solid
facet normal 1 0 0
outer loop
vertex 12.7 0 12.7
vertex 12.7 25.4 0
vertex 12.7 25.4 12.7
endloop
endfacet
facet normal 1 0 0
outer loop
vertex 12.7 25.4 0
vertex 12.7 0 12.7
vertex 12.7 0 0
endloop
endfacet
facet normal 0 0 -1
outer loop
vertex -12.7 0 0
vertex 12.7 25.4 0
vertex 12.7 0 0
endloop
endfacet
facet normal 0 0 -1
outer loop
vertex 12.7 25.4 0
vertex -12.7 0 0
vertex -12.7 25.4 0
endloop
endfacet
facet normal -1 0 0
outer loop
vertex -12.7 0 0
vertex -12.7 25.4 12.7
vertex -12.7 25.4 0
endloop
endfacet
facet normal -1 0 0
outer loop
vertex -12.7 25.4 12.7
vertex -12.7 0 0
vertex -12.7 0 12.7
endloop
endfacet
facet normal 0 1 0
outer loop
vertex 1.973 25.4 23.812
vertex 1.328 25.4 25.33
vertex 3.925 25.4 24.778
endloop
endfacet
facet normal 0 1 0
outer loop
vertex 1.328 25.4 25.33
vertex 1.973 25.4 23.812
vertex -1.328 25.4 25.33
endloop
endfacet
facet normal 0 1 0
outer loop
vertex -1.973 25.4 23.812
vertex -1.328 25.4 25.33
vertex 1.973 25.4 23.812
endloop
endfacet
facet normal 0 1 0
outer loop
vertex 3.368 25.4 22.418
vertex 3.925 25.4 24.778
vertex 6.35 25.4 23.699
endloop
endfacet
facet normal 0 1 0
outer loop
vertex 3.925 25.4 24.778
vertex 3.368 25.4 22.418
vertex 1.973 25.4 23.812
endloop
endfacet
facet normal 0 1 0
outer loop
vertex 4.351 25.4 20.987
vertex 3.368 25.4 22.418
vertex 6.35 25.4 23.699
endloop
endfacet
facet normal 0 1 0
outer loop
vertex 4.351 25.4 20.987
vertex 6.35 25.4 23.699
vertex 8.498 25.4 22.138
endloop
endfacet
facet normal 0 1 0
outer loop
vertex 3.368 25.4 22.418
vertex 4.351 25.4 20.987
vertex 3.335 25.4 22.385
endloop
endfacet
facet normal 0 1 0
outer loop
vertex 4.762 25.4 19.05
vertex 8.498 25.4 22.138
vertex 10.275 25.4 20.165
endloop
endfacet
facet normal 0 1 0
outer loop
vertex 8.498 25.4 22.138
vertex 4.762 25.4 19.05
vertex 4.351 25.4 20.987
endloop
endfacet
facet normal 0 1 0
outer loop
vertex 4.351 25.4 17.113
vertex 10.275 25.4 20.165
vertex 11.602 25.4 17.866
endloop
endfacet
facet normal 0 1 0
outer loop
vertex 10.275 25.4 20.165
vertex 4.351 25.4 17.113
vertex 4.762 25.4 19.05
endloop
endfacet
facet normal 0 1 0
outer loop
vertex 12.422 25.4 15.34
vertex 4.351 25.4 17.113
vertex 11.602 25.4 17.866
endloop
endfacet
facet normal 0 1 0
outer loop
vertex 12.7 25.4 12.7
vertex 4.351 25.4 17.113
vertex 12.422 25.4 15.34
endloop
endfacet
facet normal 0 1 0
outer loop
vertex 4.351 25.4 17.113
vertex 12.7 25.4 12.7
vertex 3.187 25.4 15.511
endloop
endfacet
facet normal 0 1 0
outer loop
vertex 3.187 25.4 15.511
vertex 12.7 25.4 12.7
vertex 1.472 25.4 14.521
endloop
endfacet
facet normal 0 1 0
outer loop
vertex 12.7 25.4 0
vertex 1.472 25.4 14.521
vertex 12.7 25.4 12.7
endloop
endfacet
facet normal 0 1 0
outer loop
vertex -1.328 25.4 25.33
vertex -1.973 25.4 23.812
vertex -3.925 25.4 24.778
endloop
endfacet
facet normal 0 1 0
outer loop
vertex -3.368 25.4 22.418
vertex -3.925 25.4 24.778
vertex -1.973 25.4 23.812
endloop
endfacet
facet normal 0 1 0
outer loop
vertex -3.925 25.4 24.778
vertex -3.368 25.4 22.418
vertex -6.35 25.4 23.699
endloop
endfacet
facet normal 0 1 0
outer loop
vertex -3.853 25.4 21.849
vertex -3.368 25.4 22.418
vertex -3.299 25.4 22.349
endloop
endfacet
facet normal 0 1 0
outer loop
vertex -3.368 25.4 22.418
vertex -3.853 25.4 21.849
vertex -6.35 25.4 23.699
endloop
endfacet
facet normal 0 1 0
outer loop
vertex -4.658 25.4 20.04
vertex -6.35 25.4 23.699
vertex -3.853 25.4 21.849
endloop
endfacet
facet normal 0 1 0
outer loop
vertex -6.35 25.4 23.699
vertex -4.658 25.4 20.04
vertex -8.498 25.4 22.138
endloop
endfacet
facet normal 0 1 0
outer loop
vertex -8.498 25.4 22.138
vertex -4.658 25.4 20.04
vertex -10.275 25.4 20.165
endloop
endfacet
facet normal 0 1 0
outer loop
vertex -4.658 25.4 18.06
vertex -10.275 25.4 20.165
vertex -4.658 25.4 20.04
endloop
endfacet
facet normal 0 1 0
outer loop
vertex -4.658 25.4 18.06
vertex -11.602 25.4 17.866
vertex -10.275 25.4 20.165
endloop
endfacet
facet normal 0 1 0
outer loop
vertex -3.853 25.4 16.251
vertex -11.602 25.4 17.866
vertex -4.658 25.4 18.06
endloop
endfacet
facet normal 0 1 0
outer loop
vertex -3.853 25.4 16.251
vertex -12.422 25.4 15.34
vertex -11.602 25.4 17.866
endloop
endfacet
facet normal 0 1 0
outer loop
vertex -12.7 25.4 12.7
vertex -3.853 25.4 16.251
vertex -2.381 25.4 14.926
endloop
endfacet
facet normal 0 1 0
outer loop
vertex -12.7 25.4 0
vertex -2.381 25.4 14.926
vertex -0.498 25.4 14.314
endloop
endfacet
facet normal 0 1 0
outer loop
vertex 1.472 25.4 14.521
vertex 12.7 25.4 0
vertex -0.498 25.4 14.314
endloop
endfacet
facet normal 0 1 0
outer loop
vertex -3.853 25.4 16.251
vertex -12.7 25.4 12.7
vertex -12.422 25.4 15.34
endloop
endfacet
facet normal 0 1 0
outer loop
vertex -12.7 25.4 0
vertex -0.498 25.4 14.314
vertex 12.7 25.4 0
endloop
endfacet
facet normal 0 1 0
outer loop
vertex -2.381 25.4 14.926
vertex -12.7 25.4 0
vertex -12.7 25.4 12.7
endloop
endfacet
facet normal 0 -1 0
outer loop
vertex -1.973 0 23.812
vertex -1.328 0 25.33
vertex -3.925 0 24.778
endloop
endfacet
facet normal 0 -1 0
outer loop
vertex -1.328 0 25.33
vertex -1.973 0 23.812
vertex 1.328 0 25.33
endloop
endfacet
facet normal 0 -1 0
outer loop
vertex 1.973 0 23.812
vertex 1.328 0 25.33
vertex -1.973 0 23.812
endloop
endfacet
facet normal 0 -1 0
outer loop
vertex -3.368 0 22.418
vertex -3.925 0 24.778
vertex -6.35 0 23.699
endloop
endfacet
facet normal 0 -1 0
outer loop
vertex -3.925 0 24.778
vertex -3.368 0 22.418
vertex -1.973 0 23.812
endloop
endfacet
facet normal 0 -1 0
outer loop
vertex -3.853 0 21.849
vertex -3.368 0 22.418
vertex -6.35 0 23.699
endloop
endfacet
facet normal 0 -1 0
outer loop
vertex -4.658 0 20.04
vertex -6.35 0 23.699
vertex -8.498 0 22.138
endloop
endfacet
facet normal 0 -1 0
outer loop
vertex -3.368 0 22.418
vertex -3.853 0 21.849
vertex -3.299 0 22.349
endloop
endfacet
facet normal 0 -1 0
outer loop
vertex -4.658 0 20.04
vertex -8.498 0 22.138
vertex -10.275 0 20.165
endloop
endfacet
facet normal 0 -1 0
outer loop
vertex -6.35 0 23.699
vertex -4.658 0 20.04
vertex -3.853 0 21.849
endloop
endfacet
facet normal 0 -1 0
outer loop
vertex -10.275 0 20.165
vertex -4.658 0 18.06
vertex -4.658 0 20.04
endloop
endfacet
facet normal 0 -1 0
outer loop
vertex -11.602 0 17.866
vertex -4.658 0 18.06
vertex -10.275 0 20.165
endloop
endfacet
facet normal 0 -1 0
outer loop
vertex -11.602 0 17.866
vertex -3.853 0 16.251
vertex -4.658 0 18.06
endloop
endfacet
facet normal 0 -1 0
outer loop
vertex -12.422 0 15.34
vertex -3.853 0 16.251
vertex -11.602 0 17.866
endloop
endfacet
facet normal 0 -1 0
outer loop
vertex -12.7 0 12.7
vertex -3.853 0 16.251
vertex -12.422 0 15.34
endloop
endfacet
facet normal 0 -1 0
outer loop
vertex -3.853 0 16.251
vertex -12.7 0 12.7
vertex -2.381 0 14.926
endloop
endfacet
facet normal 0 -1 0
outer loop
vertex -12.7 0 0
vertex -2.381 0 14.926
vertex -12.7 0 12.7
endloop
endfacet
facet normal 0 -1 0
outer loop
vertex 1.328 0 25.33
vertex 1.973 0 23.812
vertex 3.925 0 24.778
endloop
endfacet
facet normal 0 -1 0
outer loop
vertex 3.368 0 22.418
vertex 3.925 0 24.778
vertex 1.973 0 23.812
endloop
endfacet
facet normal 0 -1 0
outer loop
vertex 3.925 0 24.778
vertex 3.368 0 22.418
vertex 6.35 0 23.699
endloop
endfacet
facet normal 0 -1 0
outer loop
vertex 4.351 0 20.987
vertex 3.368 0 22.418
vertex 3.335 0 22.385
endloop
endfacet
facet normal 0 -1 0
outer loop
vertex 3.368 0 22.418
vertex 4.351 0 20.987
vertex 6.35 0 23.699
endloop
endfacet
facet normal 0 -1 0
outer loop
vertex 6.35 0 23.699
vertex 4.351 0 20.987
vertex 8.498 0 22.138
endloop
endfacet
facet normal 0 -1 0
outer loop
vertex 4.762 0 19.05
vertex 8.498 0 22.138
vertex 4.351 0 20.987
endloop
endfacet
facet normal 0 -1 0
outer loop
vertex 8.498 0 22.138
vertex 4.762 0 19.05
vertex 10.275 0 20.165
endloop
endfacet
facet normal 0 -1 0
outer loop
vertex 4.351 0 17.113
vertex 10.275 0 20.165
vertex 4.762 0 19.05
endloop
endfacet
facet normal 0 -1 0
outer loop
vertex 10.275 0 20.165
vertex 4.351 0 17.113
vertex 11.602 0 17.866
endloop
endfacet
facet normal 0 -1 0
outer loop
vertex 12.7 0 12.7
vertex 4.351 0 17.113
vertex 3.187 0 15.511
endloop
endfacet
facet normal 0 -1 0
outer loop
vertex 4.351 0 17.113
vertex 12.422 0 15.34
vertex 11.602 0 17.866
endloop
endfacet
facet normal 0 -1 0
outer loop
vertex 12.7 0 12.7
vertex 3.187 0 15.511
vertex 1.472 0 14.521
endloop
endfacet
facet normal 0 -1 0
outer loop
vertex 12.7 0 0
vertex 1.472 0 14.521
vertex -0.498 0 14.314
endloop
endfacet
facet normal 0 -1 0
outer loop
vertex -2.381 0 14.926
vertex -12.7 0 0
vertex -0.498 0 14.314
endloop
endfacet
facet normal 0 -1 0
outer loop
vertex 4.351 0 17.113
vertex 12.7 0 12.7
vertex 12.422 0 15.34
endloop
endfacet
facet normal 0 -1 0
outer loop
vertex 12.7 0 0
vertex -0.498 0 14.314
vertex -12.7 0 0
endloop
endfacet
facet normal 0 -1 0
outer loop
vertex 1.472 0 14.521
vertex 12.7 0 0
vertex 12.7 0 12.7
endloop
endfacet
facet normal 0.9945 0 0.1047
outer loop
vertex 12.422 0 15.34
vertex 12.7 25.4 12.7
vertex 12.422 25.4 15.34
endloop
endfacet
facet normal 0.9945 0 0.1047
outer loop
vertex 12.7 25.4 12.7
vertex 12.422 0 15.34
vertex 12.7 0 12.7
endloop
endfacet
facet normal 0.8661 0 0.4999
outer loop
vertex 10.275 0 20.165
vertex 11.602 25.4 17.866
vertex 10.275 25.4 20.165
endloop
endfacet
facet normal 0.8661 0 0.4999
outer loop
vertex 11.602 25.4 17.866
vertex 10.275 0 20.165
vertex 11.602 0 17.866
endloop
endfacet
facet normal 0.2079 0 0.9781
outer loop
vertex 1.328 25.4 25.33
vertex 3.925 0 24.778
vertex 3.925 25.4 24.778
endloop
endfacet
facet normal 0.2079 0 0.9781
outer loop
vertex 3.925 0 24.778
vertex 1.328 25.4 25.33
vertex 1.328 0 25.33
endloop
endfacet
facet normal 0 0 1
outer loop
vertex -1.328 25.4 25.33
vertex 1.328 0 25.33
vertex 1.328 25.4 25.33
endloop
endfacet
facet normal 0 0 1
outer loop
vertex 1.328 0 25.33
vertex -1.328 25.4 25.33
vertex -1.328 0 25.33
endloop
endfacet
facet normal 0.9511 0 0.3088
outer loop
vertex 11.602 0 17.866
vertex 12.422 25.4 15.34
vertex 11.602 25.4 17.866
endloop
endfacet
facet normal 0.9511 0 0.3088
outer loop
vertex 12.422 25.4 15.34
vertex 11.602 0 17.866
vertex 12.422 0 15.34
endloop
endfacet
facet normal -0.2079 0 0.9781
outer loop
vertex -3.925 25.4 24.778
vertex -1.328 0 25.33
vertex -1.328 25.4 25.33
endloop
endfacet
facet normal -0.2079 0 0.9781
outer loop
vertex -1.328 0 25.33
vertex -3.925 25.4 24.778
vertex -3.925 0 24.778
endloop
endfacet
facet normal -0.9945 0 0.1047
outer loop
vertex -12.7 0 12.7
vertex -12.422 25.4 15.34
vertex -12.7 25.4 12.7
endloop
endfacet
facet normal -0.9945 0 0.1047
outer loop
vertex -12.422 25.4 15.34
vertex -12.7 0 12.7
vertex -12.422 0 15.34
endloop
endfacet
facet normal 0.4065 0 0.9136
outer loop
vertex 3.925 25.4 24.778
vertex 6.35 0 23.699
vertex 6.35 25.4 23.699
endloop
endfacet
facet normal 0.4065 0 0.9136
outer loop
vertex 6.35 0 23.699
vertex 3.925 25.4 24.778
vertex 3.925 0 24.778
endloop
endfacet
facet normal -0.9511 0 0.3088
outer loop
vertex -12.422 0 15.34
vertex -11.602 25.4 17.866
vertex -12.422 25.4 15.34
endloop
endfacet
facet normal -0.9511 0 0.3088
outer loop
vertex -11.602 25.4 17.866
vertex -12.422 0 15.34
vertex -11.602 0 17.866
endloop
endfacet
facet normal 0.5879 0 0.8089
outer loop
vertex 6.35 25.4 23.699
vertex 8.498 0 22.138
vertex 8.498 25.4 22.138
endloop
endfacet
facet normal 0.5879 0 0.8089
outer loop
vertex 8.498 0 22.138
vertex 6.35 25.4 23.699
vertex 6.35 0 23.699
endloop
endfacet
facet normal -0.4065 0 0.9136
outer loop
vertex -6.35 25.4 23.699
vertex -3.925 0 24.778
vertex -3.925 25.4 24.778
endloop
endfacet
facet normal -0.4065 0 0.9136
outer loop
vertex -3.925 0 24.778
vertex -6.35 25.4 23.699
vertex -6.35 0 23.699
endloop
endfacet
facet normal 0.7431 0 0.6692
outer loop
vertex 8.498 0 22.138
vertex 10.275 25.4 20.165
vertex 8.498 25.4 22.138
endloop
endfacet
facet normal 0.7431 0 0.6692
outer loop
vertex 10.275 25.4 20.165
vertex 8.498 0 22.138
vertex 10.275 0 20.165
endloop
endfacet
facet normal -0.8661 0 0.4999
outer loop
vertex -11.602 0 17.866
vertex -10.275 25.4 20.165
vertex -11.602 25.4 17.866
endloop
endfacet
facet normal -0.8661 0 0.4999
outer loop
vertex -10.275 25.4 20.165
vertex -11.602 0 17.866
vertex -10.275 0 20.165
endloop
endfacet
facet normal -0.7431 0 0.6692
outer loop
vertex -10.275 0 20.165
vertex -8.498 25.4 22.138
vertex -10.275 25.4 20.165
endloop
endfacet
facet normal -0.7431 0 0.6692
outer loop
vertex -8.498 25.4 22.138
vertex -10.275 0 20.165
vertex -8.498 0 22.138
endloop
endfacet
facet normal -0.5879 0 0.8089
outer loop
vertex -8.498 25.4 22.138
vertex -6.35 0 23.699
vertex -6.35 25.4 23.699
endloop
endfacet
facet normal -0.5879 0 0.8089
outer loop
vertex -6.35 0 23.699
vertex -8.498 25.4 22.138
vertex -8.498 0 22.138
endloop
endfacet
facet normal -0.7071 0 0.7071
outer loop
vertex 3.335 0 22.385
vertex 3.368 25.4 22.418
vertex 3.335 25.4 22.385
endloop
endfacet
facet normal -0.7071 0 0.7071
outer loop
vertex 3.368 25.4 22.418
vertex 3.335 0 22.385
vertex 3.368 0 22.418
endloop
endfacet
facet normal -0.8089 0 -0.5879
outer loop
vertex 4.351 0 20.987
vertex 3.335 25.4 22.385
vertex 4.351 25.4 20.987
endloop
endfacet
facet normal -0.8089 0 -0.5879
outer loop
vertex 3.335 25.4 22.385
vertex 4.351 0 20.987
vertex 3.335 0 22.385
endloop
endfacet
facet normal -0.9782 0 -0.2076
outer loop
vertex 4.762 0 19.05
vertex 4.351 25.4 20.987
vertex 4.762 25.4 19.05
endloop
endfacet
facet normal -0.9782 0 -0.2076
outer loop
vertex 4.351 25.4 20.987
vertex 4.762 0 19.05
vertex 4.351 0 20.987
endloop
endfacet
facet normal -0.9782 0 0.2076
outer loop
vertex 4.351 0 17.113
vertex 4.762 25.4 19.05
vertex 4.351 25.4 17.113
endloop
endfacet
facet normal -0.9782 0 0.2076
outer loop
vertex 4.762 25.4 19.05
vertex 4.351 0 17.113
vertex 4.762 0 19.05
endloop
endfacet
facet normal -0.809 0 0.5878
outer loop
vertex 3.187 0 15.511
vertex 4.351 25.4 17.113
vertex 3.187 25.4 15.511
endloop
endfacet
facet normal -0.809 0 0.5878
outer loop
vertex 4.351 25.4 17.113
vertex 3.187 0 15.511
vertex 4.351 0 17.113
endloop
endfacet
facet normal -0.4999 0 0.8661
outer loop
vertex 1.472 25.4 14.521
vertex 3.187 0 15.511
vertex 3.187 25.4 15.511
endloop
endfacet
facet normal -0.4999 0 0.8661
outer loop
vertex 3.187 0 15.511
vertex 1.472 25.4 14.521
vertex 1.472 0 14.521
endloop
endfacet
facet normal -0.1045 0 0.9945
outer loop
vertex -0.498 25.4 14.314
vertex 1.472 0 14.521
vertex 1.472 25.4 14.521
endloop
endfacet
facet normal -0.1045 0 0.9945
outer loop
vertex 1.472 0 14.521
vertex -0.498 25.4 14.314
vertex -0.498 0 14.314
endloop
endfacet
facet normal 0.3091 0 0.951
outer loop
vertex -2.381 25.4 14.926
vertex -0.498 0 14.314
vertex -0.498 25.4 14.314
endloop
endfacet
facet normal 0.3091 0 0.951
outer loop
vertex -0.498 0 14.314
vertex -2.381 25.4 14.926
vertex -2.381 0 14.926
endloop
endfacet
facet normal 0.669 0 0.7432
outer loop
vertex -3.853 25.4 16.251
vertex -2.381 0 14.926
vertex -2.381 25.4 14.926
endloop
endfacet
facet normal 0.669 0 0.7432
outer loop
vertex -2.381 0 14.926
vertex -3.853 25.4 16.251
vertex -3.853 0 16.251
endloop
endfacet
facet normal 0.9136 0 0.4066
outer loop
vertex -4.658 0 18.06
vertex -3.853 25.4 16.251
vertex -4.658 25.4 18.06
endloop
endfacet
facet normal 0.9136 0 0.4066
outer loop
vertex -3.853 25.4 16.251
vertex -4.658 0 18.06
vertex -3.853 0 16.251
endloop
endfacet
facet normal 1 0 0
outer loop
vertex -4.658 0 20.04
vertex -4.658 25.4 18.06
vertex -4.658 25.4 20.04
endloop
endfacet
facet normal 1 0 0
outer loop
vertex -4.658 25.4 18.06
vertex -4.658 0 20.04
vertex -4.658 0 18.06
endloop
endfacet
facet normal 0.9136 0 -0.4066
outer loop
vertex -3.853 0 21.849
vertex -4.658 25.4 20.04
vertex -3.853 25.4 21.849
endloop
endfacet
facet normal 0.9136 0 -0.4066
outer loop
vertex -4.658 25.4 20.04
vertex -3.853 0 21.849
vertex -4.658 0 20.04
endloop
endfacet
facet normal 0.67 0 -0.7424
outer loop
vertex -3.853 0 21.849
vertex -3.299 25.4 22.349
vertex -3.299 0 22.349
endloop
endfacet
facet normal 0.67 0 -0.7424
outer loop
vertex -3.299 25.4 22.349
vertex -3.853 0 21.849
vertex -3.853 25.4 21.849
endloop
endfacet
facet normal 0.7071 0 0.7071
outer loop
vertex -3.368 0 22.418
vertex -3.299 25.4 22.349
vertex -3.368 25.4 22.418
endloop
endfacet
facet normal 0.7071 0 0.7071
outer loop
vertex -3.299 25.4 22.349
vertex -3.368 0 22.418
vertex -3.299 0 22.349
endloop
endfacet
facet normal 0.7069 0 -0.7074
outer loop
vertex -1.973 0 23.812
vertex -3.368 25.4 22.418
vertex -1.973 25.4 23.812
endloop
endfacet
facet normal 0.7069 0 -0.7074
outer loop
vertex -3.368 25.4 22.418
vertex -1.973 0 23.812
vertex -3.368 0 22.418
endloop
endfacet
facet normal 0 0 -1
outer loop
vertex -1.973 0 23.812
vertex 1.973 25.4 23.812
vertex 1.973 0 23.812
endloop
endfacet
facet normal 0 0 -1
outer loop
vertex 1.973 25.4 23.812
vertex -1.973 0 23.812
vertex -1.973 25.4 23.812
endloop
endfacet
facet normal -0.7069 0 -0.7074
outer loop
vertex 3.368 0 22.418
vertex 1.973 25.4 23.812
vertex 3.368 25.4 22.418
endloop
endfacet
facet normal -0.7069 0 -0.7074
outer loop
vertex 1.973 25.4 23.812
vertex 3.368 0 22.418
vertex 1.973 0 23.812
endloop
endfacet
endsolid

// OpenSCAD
// file: sight_mount_side_profile.scad
// Sight Mount Side Profile
// scale 1 unit = 1 inch
render_part=1; // MaverickRev6_SideProfile()
function NerfTacticalRail_Length() = 3.5;

MaverickRev6_SightMount_SideProfile_Num_Pts=17;
module MaverickRev6_SightMount_SideProfile() {
  polygon( points=[
	[0,0], [0,0.25]
	, [0.74,0.25], [0.8,0.19], [1.0,0.19], [1.06,0.25]
	, [1.34,0.25], [1.4,0.19], [1.6,0.19], [1.66,0.25]
	, [2.54,0.25], [2.6,0.19], [2.8,0.19], [2.86,0.25]
	, [3.5, 0.25], [3.5,0], [0,0]
	]
	, paths=[ [0,1,2,3,4,5,6,7,8,9,10,11,12,13,14,15,16] ]
	, convexity=10);
}

if(render_part==1) {
  echo("Rendering MaverickRev6_SightMount_SideProfile()...");
  MaverickRev6_SightMount_SideProfile();
}
// file: sight_mount_cross_section.scad
// Points for the sight mount cross-section
// scale 1 unit = 1 inch
render_part=1; // MaverickRev6_SightMount_XSection
function NerfTacticalRail_OuterHeight() = 0.25;
function NerfTacticalRail_InnerHeight() = 0.15;
function NerfTacticalRail_OuterWidth() = 0.7;
function NerfTacticalRail_InnerWidth() = 0.5;

MaverickRev6_SightMount_XSection_Num_Pts = 15;
module MaverickRev6_SightMount_XSection() {
  polygon( points=[
	[0,0], [0.25,0], [0.25,0.15], [0.35,0.15], [0.35,0.25]
	, [0.25,0.25], [0.16,0.19]
	, [0,0.19]
	, [-0.16,0.19], [-0.25,0.25]
	, [-0.35,0.25], [-0.35,0.15], [-0.25,0.15], [-0.25,0], [0,0]
	]
	, paths=[ [0,1,2,3,4,5,6,7,8,9,10,11,12,13,14] ]
	, convexity=10);
}

if(render_part==1) {
  echo("Rendering MaverickRev6_SightMount_XSection()...");
  MaverickRev6_SightMount_XSection();
}
// file: sight_mount.scad
// Sight Mount
// scale 1 unit = 1mm
// render_part=1; // MaverickRev6_SightMount
render_part=2; // Printable MaverickRev6_SightMount

use <sight_mount_cross_section.scad>
use <sight_mount_side_profile.scad>

module MaverickRev6_SightMount() {
  intersection() {
    linear_extrude(height=25.4*3.5, convexity=10, center=false) scale([25.4,25.4])
	MaverickRev6_SightMount_XSection();
    translate([25.4*0.7/2,0,0]) rotate([0,-90,0])
      linear_extrude(height=25.4*0.7, convexity=10, center=false) scale([25.4,25.4])
	MaverickRev6_SightMount_SideProfile();
  }
}

if(render_part==1) {
  echo("Rendering MaverickRev6_SightMount()...");
  MaverickRev6_SightMount();
}

if(render_part==2) {
  echo("Rendering printable MaverickRev6_SightMount()...");
  translate([0,-25.4*3.5/2,25.4*0.25]) rotate([-90,0,0]) MaverickRev6_SightMount();
}
// main file
// Sight for Maverick Rev-6
use <sight_mount.scad>
render_part=1; // MaverickRev6_Sight_Body()
render_part=2; // MaverickRev6_Sight_Holes()
render_part=3; // MaverickRev6_Sight()

module MaverickRev6_Sight_Body() {
  union() {
    translate([-25.4*0.5,0,0]) cube(size=[25.4*1.0,25.4*1.0,25.4*0.5],center=false);
    translate([0,0,25.4*0.5]) rotate([-90,0,0]) cylinder(r=25.4*1.0/2,h=25.4*1.0,center=false);
  }
}

if(render_part==1) {
  echo("Rendering MaverickRev6_Sight_Body()...");
  MaverickRev6_Sight_Body();
}

module MaverickRev6_Sight_Holes(extension=0.1) {
  translate([0,-extension,25.4*0.75]) rotate([-90,0,0])
    linear_extrude(height=25.4*1.0+2*extension, convexity=5) {
      union() {
	  circle(r=25.4*3/16);
	  intersection() {
	    rotate(-45-90) square(25.4*3/16);
	    square(25.4*3/8,center=true);
	  }
	}
    }
}

if(render_part==2) {
  echo("Rendering MaverickRev6_Sight_Holes()...");
  MaverickRev6_Sight_Holes();
}

module MaverickRev6_Sight() {
  difference() {
    MaverickRev6_Sight_Body();
    MaverickRev6_Sight_Holes();
  }
}

if(render_part==3) {
  echo("Rendering MaverickRev6_Sight()...");
  MaverickRev6_Sight();
}
